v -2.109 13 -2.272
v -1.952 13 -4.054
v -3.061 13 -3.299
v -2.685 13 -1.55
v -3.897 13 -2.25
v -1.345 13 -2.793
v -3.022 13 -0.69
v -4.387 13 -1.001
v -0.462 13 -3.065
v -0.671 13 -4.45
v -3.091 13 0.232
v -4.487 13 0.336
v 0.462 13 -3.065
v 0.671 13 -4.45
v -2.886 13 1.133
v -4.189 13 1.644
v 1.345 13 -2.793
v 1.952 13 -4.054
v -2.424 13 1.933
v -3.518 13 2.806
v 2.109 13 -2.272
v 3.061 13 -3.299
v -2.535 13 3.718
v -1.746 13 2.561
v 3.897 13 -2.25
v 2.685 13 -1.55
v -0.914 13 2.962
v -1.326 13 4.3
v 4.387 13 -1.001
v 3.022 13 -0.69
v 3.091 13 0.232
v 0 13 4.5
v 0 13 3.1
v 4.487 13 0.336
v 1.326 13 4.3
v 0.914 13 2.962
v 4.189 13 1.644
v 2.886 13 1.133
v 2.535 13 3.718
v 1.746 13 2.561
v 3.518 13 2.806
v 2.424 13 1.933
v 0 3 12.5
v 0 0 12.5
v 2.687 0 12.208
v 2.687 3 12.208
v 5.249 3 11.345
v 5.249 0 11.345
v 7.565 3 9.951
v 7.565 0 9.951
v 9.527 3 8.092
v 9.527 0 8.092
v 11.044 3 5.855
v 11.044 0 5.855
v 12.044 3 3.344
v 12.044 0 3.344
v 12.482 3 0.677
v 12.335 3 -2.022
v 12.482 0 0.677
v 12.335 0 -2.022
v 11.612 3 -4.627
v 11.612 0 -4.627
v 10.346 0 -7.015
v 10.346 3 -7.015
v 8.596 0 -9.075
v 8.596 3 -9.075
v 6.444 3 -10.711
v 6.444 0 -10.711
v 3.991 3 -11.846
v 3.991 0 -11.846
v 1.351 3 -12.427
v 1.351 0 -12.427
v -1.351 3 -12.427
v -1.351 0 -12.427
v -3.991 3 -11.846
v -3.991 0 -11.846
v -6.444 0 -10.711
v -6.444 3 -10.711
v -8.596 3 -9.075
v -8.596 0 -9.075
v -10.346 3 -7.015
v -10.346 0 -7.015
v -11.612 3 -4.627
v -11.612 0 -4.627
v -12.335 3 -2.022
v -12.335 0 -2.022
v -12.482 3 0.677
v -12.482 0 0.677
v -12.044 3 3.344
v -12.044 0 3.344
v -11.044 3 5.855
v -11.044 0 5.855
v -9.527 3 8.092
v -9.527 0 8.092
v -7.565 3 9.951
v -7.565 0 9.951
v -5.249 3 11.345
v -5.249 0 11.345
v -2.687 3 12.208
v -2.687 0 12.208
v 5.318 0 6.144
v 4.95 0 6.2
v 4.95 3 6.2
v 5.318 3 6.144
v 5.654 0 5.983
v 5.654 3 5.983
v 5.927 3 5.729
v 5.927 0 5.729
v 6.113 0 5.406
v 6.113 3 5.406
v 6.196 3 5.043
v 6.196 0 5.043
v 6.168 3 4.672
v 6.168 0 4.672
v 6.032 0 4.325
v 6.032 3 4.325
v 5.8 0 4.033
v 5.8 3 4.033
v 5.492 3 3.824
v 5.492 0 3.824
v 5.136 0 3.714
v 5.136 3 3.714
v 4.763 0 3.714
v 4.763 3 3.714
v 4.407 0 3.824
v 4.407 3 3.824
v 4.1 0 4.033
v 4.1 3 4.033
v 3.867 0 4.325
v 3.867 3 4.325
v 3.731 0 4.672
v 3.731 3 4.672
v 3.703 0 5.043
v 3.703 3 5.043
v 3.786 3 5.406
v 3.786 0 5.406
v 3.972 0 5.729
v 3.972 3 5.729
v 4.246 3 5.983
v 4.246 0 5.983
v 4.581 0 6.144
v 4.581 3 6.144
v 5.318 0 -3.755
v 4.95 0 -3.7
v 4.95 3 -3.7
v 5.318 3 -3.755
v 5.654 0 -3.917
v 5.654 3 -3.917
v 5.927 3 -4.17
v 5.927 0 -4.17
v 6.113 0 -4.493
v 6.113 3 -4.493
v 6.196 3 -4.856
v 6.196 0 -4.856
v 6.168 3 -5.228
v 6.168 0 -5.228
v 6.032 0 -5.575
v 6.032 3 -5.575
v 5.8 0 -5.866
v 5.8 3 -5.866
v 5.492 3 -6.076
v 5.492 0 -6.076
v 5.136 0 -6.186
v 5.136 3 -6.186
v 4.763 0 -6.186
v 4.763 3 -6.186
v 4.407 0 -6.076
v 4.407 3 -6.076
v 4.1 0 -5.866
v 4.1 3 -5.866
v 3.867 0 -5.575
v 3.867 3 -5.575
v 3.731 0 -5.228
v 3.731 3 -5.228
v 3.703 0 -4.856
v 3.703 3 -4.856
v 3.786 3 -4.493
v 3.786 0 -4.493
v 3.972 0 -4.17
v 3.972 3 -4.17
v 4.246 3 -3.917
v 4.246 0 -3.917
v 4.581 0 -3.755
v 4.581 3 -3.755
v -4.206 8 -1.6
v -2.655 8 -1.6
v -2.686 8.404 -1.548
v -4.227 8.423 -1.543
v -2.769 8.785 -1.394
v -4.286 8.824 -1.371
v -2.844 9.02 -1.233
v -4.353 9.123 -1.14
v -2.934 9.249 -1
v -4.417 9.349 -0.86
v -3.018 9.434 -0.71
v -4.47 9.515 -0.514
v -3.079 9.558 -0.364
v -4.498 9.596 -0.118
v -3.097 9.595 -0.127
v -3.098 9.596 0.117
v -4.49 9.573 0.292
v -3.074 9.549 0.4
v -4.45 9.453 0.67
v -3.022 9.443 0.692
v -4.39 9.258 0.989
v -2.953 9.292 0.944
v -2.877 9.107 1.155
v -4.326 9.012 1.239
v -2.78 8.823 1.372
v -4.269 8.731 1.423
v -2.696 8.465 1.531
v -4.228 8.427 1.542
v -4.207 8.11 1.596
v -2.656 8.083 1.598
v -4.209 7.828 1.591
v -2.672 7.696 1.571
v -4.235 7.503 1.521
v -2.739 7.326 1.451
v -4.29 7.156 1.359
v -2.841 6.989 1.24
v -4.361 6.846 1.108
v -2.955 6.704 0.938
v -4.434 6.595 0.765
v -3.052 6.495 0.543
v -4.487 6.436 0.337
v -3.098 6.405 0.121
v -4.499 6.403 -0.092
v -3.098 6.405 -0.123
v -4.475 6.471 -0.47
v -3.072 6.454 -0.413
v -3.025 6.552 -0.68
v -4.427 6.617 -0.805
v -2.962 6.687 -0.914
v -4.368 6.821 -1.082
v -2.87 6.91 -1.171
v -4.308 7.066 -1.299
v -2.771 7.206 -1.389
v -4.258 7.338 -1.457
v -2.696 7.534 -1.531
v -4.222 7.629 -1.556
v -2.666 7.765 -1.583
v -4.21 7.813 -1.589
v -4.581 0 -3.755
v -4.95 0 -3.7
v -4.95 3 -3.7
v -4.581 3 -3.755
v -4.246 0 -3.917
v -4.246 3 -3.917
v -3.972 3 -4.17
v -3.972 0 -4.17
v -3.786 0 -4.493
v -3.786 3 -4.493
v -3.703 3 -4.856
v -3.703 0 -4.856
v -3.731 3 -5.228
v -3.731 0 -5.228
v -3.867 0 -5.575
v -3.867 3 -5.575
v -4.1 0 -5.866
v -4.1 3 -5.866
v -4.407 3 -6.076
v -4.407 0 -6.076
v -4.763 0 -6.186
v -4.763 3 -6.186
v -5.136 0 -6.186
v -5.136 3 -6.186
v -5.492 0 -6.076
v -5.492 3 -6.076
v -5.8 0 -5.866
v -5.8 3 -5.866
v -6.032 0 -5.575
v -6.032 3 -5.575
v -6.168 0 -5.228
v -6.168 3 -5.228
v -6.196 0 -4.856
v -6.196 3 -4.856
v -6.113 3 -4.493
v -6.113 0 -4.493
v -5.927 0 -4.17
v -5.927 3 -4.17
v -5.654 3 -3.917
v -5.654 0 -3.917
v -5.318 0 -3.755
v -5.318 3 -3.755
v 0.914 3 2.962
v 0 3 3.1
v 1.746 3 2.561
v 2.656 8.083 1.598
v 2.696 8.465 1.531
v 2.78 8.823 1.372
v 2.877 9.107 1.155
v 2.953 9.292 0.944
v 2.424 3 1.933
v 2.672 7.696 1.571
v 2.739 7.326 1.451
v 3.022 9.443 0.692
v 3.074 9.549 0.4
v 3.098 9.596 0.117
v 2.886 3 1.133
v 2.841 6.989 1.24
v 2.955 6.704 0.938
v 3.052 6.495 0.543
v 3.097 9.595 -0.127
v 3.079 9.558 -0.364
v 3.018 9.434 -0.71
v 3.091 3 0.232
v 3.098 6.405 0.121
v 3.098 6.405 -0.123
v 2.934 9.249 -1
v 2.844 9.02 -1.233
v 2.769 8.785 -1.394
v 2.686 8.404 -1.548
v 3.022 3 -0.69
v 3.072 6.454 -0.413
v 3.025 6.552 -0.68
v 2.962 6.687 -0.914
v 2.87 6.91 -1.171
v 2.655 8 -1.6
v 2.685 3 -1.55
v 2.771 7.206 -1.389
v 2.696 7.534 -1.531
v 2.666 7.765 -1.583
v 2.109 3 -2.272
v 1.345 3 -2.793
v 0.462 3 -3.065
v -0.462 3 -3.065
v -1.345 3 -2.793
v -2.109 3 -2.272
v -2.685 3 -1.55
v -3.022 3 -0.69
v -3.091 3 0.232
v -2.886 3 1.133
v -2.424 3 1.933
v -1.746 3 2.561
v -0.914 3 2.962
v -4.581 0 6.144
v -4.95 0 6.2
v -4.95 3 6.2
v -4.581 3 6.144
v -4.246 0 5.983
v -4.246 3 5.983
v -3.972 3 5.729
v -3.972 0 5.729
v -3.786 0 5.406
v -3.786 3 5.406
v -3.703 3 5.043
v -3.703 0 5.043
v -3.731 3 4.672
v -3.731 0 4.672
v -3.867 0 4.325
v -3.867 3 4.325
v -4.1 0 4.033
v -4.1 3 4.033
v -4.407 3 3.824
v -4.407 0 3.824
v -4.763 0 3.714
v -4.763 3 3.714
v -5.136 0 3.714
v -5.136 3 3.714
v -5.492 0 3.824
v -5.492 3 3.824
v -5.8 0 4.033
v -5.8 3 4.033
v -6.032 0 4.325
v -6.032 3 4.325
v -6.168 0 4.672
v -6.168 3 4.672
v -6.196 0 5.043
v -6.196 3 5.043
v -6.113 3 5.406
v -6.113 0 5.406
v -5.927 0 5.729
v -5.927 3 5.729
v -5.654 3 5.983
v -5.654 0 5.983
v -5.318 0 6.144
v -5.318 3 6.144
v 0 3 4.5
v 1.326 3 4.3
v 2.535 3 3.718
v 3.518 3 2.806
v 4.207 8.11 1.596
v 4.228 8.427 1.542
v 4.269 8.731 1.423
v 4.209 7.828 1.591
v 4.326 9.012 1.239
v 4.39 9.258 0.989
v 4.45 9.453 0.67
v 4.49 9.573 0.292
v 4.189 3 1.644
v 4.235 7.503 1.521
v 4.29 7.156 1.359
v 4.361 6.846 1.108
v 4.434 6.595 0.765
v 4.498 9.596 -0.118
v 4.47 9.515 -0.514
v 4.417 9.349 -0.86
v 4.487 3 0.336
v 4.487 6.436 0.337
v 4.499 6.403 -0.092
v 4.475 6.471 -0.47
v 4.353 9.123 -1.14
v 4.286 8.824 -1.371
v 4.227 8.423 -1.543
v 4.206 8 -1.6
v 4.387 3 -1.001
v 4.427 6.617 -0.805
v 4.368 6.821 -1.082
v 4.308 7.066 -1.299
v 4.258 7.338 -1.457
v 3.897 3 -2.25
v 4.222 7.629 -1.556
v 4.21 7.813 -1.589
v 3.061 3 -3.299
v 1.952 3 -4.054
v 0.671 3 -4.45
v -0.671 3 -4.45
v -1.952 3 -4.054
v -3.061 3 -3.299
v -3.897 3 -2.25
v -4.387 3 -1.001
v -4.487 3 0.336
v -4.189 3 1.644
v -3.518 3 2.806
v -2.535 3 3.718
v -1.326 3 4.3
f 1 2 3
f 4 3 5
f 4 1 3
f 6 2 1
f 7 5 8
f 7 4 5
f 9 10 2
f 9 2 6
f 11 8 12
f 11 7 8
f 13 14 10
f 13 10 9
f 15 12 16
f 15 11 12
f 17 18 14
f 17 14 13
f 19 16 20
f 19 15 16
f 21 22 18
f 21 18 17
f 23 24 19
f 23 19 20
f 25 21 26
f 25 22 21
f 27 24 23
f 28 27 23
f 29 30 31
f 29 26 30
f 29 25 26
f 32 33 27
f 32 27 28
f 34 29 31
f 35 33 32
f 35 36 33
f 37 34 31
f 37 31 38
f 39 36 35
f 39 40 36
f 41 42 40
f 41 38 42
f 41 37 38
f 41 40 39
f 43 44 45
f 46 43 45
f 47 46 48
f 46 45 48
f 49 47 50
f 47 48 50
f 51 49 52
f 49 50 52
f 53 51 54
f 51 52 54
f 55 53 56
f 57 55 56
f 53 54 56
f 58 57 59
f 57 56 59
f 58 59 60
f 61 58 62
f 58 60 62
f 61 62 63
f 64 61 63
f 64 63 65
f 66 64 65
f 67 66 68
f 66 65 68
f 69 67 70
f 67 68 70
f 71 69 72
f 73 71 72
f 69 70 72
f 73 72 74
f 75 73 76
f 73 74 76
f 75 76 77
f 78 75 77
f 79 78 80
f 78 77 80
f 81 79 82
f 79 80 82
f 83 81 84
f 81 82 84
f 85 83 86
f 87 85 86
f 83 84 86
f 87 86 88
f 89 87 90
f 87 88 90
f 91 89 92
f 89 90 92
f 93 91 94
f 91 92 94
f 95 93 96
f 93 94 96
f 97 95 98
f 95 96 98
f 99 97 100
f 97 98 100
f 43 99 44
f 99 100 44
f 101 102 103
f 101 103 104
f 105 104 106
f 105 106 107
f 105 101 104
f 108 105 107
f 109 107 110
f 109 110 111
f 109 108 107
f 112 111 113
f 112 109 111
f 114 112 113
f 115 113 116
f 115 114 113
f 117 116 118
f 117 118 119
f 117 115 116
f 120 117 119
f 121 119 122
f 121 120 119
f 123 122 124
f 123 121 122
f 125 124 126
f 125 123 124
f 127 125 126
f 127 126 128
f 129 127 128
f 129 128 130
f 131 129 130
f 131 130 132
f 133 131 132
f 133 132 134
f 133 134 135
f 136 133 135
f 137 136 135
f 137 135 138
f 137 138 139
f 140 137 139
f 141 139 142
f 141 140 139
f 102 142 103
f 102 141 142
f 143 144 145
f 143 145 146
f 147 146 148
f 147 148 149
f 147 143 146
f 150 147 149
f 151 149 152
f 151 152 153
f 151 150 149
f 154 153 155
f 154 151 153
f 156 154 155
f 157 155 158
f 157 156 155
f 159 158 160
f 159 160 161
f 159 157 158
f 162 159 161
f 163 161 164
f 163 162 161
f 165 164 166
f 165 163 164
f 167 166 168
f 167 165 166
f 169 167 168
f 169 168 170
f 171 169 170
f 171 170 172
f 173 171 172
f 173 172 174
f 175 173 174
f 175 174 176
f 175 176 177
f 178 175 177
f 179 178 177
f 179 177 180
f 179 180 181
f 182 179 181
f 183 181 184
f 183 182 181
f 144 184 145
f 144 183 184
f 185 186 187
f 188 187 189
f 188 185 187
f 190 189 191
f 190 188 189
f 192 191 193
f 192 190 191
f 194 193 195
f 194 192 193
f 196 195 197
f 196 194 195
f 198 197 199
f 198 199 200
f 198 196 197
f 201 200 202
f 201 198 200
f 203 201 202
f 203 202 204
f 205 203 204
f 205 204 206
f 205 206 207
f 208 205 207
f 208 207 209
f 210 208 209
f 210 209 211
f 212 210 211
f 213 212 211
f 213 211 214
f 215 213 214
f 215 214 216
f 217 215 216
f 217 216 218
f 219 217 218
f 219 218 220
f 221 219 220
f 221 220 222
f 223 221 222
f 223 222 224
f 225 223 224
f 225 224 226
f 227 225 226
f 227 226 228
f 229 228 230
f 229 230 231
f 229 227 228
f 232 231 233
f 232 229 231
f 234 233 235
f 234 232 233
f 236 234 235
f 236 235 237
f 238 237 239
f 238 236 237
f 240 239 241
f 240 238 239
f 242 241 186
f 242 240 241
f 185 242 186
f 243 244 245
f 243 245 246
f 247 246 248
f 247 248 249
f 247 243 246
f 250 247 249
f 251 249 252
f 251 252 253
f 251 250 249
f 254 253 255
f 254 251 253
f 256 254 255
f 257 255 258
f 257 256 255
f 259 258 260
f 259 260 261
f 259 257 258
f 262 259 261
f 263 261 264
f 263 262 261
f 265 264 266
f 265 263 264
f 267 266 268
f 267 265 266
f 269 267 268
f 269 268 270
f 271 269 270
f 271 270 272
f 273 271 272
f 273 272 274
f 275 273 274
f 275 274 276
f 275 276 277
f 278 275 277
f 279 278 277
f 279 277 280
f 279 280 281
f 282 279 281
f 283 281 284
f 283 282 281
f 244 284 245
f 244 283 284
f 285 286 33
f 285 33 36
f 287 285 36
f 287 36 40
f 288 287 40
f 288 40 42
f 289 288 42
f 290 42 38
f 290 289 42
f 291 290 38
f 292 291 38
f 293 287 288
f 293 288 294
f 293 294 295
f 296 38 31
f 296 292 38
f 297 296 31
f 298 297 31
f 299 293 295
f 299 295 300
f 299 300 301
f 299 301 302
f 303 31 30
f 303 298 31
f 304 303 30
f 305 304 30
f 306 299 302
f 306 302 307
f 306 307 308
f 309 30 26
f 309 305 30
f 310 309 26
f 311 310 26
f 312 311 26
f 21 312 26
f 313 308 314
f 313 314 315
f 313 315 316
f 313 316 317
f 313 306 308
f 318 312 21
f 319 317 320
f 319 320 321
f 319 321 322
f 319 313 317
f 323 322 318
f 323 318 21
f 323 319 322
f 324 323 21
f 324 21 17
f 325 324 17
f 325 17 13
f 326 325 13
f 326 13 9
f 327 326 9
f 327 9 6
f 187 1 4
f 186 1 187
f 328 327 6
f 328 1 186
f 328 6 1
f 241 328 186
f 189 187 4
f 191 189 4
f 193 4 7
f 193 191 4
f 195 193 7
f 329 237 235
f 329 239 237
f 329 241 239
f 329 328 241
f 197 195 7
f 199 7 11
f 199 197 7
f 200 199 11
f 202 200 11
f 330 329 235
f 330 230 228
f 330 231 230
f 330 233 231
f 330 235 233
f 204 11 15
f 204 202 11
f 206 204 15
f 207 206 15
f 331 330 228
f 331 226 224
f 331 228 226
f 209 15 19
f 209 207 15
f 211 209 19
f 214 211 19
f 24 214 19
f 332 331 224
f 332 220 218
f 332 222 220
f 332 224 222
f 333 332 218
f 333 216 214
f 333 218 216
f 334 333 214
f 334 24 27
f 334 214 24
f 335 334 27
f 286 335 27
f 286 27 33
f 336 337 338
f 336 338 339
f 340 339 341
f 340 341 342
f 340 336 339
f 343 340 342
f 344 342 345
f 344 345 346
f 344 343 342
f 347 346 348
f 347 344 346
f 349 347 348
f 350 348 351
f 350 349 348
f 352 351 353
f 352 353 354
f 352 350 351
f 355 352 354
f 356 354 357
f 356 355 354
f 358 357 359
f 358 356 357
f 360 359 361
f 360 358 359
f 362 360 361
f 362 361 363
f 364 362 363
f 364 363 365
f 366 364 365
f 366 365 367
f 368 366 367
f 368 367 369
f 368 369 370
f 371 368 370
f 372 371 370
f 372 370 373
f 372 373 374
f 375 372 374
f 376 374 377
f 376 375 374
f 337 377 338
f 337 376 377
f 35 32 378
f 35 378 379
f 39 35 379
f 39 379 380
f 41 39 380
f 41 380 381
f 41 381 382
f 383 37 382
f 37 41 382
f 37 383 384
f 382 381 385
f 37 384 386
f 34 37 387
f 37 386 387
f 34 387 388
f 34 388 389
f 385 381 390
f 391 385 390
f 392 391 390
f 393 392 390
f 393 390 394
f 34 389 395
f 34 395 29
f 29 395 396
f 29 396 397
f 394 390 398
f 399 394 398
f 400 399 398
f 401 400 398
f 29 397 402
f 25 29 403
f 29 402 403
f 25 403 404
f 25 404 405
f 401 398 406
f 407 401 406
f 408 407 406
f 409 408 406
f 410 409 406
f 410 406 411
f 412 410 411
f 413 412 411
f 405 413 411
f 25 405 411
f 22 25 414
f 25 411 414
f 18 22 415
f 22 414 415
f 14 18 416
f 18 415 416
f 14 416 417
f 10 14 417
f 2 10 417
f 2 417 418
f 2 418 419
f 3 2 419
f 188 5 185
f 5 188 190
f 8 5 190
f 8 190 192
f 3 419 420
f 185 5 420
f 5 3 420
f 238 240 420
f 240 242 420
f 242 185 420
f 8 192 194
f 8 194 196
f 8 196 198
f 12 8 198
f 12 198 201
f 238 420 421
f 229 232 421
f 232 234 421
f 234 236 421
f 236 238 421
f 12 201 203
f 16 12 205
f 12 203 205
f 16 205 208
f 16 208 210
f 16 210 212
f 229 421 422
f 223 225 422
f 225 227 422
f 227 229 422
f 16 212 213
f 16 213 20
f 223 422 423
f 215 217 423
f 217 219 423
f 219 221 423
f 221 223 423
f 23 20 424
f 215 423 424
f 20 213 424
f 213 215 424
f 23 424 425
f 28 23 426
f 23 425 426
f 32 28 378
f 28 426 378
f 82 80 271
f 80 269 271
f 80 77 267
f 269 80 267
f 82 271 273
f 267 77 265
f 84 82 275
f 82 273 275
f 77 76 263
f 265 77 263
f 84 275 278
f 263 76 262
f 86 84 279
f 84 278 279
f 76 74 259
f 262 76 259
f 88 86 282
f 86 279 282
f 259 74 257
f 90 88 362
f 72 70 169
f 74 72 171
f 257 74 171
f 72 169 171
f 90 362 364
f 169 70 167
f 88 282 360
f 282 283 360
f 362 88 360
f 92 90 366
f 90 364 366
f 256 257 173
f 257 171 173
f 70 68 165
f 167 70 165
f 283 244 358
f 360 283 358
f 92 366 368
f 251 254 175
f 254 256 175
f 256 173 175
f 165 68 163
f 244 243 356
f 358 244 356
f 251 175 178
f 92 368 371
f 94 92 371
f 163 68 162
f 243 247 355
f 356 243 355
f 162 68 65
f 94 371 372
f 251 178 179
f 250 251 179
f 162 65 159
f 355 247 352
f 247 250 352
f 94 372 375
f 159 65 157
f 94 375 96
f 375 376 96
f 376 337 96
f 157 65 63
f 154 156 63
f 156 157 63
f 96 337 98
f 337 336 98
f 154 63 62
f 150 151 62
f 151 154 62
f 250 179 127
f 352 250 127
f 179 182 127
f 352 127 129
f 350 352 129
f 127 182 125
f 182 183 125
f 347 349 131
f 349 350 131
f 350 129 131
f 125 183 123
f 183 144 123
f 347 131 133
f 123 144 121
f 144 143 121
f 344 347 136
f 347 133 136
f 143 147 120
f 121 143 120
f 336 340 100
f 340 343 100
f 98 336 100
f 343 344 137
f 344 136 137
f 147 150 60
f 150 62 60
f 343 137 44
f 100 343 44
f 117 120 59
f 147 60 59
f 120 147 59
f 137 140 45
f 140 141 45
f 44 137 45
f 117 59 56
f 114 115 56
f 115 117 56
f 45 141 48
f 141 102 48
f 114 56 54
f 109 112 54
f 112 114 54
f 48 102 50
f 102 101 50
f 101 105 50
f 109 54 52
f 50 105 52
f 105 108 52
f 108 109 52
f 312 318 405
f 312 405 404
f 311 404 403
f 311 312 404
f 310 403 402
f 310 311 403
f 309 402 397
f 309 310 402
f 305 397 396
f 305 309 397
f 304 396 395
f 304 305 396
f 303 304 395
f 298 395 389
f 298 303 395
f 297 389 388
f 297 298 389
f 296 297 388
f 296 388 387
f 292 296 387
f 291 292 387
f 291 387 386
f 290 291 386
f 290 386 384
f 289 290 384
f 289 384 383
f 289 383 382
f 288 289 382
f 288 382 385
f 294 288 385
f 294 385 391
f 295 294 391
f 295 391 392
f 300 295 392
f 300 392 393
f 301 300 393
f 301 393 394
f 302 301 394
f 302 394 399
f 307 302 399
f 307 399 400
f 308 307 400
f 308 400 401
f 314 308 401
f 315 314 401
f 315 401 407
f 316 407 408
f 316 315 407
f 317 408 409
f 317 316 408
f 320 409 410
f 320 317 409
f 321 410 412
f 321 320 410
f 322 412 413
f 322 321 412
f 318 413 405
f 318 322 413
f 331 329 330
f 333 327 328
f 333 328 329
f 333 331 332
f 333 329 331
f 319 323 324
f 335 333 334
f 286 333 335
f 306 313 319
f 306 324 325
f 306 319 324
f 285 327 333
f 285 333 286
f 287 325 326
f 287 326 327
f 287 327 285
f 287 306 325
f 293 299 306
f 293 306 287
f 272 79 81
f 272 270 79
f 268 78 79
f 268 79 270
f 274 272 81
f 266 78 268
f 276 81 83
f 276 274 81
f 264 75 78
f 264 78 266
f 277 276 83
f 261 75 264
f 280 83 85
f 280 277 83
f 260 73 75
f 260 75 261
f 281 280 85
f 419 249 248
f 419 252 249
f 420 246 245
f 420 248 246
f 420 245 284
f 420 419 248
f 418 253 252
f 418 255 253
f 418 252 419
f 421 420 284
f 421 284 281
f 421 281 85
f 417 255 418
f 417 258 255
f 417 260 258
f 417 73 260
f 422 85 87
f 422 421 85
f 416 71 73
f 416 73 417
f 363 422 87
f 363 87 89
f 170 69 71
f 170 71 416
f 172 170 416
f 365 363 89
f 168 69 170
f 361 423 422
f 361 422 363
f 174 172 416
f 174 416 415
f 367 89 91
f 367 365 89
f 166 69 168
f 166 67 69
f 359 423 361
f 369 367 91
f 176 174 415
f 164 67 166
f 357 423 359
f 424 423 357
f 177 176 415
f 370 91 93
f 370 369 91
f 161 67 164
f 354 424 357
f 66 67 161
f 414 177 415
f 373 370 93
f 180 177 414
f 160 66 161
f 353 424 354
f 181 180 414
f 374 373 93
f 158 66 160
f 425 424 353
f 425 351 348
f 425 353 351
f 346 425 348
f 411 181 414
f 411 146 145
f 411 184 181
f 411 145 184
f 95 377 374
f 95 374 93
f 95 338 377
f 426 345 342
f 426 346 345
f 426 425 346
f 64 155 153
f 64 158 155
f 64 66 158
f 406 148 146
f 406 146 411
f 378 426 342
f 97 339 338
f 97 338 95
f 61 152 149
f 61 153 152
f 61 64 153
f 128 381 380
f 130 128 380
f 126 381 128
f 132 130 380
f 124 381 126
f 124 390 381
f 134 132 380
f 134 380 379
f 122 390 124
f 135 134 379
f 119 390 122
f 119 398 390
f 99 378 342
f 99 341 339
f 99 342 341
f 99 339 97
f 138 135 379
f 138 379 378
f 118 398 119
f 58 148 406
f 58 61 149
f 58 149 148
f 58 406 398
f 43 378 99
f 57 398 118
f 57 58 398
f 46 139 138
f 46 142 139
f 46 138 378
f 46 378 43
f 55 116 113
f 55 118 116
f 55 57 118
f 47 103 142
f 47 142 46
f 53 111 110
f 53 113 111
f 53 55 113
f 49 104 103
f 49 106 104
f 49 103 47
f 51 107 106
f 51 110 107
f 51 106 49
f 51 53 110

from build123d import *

# Parameters (mm, degrees)
CROQUIS1_R                 = 12.5
CROQUIS1_R_2               = 1.25
SALIENTE_EXTRUIR1_DEPTH    = 3
SALIENTE_EXTRUIR2_START    = 3
CROQUIS1_3_R               = 4.5
CROQUIS1_3_R_2             = 3.1
SALIENTE_EXTRUIR2_DEPTH    = 10
CORTAR_EXTRUIR1_DEPTH      = 22.943108257
CORTAR_EXTRUIR1_DEPTH_BACK = 22.943108257
CROQUIS2_R                 = 1.6


with BuildPart() as part:
    # Croquis1 → Saliente-Extruir1 (new body)
    with BuildSketch(Plane(origin=(0, 0, 0), x_dir=(1, 0, 0), z_dir=(0, 1, 0))):
        with Locations(Location((0, 0, 0), (0, 0, 270))):
            Circle(CROQUIS1_R)
        with Locations(Location((-4.949747468, 4.949747468, 0), (0, 0, 270))):
            Circle(CROQUIS1_R_2, mode=Mode.SUBTRACT)
        with Locations(Location((4.949747468, 4.949747468, 0), (0, 0, 270))):
            Circle(CROQUIS1_R_2, mode=Mode.SUBTRACT)
        with Locations(Location((4.949747468, -4.949747468, 0), (0, 0, 270))):
            Circle(CROQUIS1_R_2, mode=Mode.SUBTRACT)
        with Locations(Location((-4.949747468, -4.949747468, 0), (0, 0, 270))):
            Circle(CROQUIS1_R_2, mode=Mode.SUBTRACT)
    extrude(amount=SALIENTE_EXTRUIR1_DEPTH)

    # Croquis1<3> → Saliente-Extruir2 (add)
    with BuildSketch(Plane(origin=(0, 0, 0), x_dir=(1, 0, 0), z_dir=(0, 1, 0)).offset(SALIENTE_EXTRUIR2_START)):
        with Locations(Location((0, 0, 0), (0, 0, 270))):
            Circle(CROQUIS1_3_R)
        with Locations(Location((0, 0, 0), (0, 0, 270))):
            Circle(CROQUIS1_3_R_2, mode=Mode.SUBTRACT)
    extrude(amount=SALIENTE_EXTRUIR2_DEPTH)

    # Croquis2 → Cortar-Extruir1 (cut, two sides: drawn at the far end of the back side and taken through both)
    with BuildSketch(Plane(origin=(0, 0, 0), x_dir=(0, 0, -1), z_dir=(1, 0, 0)).offset(-CORTAR_EXTRUIR1_DEPTH_BACK)):
        with Locations((0, 8)):
            Circle(CROQUIS2_R)
    extrude(amount=CORTAR_EXTRUIR1_DEPTH + CORTAR_EXTRUIR1_DEPTH_BACK, mode=Mode.SUBTRACT)


solid = part.part
